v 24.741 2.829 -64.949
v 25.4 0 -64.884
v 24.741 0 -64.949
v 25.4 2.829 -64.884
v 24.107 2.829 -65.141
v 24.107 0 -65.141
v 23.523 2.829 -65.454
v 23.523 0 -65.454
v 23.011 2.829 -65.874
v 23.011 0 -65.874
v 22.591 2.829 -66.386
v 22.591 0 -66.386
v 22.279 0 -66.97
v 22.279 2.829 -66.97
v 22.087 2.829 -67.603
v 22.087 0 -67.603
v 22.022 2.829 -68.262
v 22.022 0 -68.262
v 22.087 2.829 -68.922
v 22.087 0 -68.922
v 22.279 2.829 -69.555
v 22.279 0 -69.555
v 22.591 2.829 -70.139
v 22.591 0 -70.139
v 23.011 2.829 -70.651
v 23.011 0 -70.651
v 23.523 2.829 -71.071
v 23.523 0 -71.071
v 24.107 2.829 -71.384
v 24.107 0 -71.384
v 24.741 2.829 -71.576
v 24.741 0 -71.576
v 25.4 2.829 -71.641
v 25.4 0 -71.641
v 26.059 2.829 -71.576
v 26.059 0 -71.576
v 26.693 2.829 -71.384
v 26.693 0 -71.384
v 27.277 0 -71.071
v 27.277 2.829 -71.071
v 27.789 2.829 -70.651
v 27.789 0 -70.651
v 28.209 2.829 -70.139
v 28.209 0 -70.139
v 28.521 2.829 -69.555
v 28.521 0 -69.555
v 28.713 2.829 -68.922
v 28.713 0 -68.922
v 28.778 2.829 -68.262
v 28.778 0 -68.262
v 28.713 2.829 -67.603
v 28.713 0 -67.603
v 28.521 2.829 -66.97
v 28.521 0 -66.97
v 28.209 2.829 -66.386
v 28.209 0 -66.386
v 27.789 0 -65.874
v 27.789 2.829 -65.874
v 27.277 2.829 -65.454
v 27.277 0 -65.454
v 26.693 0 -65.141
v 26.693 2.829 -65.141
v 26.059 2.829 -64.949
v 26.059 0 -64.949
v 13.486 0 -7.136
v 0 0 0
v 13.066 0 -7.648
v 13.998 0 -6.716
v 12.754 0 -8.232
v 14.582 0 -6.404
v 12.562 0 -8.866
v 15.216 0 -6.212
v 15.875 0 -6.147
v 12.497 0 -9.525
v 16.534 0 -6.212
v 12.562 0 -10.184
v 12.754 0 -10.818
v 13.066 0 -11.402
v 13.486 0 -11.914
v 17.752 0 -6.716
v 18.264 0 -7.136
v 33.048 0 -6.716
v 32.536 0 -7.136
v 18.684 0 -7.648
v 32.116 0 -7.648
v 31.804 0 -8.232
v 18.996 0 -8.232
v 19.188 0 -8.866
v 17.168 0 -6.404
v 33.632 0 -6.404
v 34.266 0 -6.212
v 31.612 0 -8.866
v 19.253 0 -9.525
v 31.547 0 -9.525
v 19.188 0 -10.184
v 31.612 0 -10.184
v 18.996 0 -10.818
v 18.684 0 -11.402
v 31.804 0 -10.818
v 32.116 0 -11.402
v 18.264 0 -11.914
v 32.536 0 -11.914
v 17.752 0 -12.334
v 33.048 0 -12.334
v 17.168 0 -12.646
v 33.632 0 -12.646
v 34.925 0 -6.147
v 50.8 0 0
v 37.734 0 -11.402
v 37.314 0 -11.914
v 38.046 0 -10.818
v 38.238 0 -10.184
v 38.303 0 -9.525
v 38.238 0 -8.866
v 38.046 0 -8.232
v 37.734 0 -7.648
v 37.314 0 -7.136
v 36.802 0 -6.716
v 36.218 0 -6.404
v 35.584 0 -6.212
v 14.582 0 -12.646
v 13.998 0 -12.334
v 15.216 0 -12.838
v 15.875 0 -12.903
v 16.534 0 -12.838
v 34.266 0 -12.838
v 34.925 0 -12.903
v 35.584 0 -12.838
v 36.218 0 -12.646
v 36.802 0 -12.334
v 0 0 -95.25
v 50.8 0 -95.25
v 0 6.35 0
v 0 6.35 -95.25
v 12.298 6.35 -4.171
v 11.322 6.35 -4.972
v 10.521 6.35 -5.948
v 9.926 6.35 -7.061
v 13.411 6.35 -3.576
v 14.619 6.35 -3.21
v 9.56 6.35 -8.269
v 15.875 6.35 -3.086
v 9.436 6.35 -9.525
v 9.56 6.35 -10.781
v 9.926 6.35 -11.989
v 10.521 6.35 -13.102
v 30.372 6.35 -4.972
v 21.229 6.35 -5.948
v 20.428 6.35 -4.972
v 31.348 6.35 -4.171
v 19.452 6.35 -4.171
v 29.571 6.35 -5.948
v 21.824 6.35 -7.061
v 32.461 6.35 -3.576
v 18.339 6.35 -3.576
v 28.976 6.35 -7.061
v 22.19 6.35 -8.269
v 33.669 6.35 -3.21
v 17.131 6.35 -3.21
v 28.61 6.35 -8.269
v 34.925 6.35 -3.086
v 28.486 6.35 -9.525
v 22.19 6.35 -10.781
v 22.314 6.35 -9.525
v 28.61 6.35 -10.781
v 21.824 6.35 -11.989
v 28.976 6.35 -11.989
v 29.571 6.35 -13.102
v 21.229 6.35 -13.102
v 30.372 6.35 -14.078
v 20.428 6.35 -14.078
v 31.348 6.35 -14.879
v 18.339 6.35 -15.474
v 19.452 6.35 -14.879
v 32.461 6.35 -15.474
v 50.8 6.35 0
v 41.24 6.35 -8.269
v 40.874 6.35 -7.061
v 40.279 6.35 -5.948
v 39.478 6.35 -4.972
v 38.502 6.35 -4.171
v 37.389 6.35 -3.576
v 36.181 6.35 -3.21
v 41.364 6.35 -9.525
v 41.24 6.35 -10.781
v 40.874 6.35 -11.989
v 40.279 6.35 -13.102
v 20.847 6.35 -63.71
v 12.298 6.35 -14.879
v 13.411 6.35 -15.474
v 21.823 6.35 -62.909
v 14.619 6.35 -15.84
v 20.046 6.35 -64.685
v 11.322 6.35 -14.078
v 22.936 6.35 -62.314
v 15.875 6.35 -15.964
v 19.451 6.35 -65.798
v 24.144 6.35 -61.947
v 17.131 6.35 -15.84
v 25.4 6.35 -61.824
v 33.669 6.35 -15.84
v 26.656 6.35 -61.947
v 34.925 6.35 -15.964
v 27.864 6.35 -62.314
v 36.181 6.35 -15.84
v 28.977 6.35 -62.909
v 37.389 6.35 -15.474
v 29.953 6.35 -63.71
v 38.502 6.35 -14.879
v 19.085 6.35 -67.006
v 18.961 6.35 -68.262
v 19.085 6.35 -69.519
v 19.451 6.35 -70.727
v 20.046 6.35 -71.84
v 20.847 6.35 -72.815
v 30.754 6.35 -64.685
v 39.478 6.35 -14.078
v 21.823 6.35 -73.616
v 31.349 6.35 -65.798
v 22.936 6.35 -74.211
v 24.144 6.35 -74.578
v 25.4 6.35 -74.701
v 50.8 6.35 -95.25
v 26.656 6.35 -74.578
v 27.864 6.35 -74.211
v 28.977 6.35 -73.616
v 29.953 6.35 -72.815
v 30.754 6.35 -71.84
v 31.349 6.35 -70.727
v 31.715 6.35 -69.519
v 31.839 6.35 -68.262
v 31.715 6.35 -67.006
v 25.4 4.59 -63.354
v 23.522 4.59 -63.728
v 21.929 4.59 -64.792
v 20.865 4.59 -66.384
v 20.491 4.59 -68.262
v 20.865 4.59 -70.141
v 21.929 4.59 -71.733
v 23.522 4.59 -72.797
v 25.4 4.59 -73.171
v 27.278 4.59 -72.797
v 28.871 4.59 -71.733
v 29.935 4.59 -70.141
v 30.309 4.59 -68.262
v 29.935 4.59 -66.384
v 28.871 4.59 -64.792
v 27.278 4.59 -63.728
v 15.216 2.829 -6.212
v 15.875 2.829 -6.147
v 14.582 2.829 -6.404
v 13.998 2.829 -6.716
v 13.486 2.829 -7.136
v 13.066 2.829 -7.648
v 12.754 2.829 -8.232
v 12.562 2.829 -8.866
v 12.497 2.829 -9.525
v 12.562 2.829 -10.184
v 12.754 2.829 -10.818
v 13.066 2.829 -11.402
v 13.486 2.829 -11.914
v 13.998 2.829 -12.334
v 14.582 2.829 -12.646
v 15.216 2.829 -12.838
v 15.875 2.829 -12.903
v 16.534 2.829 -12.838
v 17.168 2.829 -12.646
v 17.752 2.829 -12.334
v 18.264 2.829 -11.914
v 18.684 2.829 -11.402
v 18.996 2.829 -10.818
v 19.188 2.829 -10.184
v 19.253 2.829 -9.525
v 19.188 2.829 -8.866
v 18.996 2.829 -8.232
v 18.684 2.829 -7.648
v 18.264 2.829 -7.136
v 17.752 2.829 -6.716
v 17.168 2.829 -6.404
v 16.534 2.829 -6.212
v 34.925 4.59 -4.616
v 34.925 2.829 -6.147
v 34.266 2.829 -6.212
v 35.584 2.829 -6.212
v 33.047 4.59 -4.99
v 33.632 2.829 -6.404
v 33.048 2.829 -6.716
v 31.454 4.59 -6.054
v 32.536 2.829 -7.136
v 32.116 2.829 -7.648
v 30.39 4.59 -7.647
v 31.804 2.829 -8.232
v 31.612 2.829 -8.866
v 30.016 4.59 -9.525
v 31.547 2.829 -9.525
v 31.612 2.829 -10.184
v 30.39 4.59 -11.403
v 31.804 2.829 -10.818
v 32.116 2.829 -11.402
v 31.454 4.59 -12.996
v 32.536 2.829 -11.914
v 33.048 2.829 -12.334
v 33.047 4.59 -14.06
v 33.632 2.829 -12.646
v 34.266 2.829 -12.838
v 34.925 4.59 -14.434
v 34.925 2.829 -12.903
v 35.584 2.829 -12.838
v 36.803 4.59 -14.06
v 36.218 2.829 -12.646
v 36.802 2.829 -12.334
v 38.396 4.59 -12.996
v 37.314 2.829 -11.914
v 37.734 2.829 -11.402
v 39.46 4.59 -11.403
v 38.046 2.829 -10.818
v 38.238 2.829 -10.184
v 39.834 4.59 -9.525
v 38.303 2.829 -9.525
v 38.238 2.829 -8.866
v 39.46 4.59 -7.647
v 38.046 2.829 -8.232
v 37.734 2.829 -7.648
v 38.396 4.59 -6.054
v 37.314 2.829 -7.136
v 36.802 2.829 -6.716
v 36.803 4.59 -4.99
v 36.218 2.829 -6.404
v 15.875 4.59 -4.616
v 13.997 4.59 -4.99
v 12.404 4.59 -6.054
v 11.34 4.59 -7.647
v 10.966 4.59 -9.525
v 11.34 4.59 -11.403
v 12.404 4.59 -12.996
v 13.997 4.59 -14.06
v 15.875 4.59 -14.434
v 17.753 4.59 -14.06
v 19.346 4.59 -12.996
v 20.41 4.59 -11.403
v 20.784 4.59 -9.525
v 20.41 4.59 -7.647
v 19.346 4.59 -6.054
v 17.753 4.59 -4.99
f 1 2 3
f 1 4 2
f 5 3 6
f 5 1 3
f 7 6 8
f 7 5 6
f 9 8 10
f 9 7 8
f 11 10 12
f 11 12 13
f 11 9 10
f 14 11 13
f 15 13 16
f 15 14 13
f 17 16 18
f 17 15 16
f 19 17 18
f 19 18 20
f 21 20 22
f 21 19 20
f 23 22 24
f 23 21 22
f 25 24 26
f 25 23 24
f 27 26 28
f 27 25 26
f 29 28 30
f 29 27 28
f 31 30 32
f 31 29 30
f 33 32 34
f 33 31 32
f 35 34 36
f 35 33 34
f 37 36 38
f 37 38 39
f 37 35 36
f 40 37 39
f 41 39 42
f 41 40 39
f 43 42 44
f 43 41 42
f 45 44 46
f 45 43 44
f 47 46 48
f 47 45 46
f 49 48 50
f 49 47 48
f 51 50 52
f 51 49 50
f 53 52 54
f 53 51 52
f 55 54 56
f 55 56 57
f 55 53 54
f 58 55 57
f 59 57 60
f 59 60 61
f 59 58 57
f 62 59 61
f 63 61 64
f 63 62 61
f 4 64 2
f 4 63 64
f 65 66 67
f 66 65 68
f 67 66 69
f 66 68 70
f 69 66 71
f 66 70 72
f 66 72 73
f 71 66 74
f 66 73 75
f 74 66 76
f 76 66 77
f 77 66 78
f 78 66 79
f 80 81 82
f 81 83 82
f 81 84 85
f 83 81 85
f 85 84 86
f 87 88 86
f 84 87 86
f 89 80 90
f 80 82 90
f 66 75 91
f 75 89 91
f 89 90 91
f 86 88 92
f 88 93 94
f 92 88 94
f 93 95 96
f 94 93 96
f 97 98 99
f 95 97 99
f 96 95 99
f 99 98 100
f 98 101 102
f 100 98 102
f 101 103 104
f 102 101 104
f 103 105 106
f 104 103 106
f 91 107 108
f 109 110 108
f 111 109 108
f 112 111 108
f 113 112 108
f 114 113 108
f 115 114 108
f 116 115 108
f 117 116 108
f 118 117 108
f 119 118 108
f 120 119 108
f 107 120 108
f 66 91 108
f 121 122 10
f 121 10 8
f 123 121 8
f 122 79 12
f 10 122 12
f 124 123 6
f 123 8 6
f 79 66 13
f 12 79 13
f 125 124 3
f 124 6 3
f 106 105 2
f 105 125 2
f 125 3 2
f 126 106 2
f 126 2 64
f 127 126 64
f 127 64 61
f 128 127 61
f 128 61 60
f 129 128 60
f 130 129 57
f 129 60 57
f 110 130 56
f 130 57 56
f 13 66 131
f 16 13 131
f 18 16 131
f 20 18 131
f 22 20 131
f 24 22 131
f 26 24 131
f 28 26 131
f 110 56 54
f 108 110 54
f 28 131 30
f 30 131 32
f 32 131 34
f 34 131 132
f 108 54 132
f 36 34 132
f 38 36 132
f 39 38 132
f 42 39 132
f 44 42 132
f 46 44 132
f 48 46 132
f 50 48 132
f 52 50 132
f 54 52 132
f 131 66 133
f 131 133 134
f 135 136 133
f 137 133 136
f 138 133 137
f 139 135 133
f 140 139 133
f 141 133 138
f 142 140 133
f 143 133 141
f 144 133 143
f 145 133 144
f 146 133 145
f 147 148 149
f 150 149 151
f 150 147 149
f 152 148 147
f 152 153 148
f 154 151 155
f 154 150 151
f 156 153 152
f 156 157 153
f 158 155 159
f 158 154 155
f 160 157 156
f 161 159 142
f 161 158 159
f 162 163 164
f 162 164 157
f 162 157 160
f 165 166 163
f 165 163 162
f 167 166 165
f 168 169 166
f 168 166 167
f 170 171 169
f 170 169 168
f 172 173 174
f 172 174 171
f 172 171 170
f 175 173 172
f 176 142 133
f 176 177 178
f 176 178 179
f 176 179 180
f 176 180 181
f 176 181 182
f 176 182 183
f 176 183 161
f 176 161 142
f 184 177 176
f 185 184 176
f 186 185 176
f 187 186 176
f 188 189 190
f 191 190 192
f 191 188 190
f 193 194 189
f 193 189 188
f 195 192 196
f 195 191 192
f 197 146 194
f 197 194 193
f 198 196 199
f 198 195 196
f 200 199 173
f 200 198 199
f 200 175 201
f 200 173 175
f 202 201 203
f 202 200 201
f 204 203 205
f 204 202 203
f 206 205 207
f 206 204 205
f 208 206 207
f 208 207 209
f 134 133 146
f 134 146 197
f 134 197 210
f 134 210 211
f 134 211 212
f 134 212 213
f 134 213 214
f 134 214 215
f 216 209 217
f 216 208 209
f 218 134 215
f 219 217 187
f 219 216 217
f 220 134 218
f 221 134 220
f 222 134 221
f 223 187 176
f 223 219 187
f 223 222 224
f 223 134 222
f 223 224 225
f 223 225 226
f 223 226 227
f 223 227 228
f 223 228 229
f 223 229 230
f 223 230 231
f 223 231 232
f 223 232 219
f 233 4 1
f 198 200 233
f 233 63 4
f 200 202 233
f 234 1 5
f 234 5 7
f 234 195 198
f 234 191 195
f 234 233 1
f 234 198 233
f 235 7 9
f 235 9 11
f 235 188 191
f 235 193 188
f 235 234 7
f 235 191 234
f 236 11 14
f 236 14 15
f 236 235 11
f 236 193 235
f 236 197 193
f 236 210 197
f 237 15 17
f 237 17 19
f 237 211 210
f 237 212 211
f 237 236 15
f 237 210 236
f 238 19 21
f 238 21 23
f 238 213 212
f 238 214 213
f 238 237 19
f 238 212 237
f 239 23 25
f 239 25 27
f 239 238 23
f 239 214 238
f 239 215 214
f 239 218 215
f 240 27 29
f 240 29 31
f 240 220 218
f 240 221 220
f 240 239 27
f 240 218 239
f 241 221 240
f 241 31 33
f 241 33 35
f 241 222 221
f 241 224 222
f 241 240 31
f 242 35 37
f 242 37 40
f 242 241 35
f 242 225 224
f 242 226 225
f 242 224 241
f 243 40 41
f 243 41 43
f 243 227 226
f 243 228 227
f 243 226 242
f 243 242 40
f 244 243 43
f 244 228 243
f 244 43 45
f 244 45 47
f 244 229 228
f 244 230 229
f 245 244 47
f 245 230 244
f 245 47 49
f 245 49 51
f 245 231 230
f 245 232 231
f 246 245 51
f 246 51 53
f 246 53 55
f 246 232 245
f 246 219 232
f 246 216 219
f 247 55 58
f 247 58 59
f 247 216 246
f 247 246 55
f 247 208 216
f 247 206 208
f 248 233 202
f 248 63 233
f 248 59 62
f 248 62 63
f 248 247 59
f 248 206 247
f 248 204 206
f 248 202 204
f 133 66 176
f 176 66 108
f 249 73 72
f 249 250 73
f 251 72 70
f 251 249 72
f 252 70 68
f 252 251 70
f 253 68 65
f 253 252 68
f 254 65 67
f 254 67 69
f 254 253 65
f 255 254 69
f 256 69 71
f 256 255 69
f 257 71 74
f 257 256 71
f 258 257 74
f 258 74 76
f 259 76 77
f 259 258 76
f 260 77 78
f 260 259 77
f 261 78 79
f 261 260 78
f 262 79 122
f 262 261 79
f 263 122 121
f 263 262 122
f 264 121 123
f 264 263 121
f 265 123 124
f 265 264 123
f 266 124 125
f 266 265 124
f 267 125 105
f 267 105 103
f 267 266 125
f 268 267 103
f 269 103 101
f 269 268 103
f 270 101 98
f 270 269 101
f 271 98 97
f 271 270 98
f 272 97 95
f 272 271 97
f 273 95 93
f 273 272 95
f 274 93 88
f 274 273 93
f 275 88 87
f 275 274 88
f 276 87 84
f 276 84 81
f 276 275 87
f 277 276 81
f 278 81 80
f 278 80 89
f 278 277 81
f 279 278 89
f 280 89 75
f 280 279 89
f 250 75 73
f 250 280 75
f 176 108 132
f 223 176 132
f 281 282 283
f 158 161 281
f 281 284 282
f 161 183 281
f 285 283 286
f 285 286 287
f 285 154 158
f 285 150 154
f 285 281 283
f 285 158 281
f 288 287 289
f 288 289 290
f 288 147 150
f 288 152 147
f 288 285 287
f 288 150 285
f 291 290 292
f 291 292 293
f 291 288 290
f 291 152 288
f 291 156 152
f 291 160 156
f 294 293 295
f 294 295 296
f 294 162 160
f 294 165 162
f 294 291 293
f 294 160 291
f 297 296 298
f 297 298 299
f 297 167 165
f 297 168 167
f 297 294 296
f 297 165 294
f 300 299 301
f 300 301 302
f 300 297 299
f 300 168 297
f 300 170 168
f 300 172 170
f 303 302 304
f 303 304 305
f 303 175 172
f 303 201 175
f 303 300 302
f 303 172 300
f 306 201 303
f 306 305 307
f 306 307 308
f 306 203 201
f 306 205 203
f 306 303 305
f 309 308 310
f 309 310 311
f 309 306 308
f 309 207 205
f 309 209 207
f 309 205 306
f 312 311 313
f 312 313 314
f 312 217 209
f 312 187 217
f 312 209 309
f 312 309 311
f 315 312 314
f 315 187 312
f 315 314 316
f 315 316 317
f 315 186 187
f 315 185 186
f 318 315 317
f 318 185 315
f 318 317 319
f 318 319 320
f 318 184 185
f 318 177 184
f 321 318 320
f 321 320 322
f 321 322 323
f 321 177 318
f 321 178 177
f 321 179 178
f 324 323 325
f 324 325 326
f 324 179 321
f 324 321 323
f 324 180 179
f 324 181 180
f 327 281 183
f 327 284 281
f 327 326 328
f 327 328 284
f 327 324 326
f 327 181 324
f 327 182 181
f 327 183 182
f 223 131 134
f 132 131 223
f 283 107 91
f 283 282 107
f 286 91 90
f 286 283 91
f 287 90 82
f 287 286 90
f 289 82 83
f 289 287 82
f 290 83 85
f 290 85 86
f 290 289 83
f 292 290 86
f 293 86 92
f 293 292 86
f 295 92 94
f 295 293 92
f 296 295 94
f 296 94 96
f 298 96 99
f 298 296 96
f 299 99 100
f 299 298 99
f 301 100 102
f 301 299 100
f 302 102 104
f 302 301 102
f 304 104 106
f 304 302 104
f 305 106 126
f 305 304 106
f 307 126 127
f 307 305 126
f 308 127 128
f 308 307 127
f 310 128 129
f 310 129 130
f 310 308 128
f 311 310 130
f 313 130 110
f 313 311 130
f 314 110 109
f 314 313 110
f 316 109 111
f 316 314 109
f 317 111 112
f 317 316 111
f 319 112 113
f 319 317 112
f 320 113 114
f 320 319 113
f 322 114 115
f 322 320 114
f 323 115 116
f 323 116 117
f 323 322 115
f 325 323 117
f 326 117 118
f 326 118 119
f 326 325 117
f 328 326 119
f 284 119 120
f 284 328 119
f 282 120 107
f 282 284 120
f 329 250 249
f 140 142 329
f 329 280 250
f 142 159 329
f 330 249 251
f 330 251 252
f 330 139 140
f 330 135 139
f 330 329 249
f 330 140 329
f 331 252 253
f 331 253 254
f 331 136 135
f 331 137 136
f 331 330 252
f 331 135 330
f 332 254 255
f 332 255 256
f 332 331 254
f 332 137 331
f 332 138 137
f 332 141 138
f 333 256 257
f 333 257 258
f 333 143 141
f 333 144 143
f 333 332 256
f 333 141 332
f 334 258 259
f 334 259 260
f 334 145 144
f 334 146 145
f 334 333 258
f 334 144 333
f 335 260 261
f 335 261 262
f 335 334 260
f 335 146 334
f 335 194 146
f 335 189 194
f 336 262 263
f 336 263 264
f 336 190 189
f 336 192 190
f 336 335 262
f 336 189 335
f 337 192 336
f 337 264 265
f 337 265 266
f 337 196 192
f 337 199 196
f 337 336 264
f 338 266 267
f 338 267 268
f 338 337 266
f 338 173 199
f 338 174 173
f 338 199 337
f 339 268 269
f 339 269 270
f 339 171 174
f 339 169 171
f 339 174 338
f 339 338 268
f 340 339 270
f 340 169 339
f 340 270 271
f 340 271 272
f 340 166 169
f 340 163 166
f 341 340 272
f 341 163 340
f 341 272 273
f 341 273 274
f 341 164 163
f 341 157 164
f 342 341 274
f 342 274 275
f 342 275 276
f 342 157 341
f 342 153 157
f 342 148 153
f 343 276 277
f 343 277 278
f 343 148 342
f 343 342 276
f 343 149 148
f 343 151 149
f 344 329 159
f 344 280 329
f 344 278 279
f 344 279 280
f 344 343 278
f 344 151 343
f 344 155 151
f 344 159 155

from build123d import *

# Parameters (mm, degrees)
SKETCH1_W                                     = 50.8
SKETCH1_H                                     = 95.25
BOSS_EXTRUDE1_DEPTH                           = 6.35
CSK_FOR_1_4_FLAT_HEAD_MACHINE_SCREW1_AT_COUNT = 2
CSK_FOR_1_4_FLAT_HEAD_MACHINE_SCREW1_AT_PITCH = 59.504785784
CSK_FOR_1_4_FLAT_HEAD_MACHINE_SCREW1_2_COUNT  = 2
CSK_FOR_1_4_FLAT_HEAD_MACHINE_SCREW1_2_PITCH  = 59.504785784


with BuildPart() as part:
    # Sketch1 → Boss-Extrude1 (new body)
    with BuildSketch(Plane(origin=(0, 0, 0), x_dir=(1, 0, 0), z_dir=(0, 1, 0))):
        with Locations((25.4, 47.625)):
            Rectangle(SKETCH1_W, SKETCH1_H)
    extrude(amount=BOSS_EXTRUDE1_DEPTH)

    # Sketch4 → CSK for 1/4 Flat Head Machine Screw1 (revolve, cut)
    with BuildSketch(Plane(origin=(25.4, 6.35, -68.2625), x_dir=(0, 0, 1), z_dir=(1, 0, 0))):
        Polygon((0, 0), (0, 6.35), (3.3782, 6.35), (3.3782, 3.520932584), (6.4389, 0), align=None)
    csk_for_1_4_flat_head_machine_screw1 = revolve(axis=Axis((25.4, 12.7, -68.2625), (0, -1, 0)), mode=Mode.SUBTRACT)

    # CSK for 1/4 Flat Head Machine Screw1 at: CSK for 1/4 Flat Head Machine Screw1 ×2
    with Locations(*[Vector(-0.16007115855366244, 0, 0.9871054777475852) * (i * CSK_FOR_1_4_FLAT_HEAD_MACHINE_SCREW1_AT_PITCH) for i in range(1, CSK_FOR_1_4_FLAT_HEAD_MACHINE_SCREW1_AT_COUNT)]):
        add(csk_for_1_4_flat_head_machine_screw1, mode=Mode.SUBTRACT)

    # CSK for 1_4 Flat Head Machine Screw1 2: CSK for 1/4 Flat Head Machine Screw1 ×2
    with Locations(*[Vector(0.16007115855366244, 0, 0.9871054777475852) * (i * CSK_FOR_1_4_FLAT_HEAD_MACHINE_SCREW1_2_PITCH) for i in range(1, CSK_FOR_1_4_FLAT_HEAD_MACHINE_SCREW1_2_COUNT)]):
        add(csk_for_1_4_flat_head_machine_screw1, mode=Mode.SUBTRACT)


solid = part.part
